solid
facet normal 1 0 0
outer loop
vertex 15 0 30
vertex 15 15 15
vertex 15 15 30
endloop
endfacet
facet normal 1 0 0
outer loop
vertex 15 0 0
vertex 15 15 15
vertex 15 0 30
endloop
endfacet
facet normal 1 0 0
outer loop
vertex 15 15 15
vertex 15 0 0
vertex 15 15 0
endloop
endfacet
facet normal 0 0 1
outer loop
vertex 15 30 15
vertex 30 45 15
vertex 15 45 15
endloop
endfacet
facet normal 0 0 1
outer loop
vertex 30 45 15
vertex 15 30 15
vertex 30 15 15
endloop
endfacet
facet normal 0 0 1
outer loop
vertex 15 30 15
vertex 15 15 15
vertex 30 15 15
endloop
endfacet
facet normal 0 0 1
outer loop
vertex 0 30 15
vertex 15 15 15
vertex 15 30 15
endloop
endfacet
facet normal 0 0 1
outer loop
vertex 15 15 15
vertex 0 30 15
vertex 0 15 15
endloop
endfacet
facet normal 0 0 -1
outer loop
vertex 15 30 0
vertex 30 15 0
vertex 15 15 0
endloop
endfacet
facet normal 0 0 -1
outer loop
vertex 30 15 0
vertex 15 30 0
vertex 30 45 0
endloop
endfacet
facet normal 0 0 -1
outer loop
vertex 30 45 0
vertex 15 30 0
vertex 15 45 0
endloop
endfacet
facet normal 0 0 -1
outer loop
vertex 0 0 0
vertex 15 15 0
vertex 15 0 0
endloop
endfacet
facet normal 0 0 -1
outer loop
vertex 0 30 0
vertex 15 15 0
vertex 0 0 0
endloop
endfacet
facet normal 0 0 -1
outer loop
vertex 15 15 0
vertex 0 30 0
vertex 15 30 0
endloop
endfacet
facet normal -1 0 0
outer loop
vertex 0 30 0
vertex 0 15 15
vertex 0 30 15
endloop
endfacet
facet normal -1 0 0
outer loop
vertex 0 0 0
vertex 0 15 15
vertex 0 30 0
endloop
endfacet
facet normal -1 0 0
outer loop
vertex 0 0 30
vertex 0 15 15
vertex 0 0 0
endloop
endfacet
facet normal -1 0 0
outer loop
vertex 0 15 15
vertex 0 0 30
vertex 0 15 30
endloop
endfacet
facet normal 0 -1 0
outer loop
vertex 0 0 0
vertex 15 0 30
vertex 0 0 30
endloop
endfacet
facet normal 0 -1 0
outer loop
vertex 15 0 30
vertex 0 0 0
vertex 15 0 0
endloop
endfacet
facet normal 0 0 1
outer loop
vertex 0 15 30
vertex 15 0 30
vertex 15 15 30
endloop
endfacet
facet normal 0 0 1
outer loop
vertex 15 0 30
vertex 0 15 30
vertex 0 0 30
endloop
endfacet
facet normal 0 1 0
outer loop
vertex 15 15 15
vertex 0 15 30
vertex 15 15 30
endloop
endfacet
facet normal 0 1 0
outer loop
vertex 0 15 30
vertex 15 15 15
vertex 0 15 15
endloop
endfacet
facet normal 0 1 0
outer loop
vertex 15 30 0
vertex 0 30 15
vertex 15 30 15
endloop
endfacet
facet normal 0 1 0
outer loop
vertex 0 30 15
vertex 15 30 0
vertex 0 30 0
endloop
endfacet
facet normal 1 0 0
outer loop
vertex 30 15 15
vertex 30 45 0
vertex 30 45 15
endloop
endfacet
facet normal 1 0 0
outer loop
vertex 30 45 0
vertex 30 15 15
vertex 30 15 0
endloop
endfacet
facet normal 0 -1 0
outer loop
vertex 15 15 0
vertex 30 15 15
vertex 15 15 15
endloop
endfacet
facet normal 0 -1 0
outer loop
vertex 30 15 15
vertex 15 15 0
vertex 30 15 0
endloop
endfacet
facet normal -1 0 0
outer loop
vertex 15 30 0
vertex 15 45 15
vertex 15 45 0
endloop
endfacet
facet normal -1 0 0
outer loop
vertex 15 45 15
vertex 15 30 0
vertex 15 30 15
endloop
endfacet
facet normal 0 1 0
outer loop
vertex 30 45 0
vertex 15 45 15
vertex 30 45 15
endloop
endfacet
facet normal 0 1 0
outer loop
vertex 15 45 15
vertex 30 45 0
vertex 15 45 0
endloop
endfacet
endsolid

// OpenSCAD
// Fongo piece 13: Twisted lightning. GPL-3.0; see README.txt.
// All cube positions derive from the canonical catalogue. z points up.
unit = 15; // mm, scale all pieces AND cards together
positions = [[0,0,0],[0,0,1],[0,1,0],[1,1,0],[1,2,0]];
union() { for (p = positions) translate(p * unit) cube([unit, unit, unit]); }
